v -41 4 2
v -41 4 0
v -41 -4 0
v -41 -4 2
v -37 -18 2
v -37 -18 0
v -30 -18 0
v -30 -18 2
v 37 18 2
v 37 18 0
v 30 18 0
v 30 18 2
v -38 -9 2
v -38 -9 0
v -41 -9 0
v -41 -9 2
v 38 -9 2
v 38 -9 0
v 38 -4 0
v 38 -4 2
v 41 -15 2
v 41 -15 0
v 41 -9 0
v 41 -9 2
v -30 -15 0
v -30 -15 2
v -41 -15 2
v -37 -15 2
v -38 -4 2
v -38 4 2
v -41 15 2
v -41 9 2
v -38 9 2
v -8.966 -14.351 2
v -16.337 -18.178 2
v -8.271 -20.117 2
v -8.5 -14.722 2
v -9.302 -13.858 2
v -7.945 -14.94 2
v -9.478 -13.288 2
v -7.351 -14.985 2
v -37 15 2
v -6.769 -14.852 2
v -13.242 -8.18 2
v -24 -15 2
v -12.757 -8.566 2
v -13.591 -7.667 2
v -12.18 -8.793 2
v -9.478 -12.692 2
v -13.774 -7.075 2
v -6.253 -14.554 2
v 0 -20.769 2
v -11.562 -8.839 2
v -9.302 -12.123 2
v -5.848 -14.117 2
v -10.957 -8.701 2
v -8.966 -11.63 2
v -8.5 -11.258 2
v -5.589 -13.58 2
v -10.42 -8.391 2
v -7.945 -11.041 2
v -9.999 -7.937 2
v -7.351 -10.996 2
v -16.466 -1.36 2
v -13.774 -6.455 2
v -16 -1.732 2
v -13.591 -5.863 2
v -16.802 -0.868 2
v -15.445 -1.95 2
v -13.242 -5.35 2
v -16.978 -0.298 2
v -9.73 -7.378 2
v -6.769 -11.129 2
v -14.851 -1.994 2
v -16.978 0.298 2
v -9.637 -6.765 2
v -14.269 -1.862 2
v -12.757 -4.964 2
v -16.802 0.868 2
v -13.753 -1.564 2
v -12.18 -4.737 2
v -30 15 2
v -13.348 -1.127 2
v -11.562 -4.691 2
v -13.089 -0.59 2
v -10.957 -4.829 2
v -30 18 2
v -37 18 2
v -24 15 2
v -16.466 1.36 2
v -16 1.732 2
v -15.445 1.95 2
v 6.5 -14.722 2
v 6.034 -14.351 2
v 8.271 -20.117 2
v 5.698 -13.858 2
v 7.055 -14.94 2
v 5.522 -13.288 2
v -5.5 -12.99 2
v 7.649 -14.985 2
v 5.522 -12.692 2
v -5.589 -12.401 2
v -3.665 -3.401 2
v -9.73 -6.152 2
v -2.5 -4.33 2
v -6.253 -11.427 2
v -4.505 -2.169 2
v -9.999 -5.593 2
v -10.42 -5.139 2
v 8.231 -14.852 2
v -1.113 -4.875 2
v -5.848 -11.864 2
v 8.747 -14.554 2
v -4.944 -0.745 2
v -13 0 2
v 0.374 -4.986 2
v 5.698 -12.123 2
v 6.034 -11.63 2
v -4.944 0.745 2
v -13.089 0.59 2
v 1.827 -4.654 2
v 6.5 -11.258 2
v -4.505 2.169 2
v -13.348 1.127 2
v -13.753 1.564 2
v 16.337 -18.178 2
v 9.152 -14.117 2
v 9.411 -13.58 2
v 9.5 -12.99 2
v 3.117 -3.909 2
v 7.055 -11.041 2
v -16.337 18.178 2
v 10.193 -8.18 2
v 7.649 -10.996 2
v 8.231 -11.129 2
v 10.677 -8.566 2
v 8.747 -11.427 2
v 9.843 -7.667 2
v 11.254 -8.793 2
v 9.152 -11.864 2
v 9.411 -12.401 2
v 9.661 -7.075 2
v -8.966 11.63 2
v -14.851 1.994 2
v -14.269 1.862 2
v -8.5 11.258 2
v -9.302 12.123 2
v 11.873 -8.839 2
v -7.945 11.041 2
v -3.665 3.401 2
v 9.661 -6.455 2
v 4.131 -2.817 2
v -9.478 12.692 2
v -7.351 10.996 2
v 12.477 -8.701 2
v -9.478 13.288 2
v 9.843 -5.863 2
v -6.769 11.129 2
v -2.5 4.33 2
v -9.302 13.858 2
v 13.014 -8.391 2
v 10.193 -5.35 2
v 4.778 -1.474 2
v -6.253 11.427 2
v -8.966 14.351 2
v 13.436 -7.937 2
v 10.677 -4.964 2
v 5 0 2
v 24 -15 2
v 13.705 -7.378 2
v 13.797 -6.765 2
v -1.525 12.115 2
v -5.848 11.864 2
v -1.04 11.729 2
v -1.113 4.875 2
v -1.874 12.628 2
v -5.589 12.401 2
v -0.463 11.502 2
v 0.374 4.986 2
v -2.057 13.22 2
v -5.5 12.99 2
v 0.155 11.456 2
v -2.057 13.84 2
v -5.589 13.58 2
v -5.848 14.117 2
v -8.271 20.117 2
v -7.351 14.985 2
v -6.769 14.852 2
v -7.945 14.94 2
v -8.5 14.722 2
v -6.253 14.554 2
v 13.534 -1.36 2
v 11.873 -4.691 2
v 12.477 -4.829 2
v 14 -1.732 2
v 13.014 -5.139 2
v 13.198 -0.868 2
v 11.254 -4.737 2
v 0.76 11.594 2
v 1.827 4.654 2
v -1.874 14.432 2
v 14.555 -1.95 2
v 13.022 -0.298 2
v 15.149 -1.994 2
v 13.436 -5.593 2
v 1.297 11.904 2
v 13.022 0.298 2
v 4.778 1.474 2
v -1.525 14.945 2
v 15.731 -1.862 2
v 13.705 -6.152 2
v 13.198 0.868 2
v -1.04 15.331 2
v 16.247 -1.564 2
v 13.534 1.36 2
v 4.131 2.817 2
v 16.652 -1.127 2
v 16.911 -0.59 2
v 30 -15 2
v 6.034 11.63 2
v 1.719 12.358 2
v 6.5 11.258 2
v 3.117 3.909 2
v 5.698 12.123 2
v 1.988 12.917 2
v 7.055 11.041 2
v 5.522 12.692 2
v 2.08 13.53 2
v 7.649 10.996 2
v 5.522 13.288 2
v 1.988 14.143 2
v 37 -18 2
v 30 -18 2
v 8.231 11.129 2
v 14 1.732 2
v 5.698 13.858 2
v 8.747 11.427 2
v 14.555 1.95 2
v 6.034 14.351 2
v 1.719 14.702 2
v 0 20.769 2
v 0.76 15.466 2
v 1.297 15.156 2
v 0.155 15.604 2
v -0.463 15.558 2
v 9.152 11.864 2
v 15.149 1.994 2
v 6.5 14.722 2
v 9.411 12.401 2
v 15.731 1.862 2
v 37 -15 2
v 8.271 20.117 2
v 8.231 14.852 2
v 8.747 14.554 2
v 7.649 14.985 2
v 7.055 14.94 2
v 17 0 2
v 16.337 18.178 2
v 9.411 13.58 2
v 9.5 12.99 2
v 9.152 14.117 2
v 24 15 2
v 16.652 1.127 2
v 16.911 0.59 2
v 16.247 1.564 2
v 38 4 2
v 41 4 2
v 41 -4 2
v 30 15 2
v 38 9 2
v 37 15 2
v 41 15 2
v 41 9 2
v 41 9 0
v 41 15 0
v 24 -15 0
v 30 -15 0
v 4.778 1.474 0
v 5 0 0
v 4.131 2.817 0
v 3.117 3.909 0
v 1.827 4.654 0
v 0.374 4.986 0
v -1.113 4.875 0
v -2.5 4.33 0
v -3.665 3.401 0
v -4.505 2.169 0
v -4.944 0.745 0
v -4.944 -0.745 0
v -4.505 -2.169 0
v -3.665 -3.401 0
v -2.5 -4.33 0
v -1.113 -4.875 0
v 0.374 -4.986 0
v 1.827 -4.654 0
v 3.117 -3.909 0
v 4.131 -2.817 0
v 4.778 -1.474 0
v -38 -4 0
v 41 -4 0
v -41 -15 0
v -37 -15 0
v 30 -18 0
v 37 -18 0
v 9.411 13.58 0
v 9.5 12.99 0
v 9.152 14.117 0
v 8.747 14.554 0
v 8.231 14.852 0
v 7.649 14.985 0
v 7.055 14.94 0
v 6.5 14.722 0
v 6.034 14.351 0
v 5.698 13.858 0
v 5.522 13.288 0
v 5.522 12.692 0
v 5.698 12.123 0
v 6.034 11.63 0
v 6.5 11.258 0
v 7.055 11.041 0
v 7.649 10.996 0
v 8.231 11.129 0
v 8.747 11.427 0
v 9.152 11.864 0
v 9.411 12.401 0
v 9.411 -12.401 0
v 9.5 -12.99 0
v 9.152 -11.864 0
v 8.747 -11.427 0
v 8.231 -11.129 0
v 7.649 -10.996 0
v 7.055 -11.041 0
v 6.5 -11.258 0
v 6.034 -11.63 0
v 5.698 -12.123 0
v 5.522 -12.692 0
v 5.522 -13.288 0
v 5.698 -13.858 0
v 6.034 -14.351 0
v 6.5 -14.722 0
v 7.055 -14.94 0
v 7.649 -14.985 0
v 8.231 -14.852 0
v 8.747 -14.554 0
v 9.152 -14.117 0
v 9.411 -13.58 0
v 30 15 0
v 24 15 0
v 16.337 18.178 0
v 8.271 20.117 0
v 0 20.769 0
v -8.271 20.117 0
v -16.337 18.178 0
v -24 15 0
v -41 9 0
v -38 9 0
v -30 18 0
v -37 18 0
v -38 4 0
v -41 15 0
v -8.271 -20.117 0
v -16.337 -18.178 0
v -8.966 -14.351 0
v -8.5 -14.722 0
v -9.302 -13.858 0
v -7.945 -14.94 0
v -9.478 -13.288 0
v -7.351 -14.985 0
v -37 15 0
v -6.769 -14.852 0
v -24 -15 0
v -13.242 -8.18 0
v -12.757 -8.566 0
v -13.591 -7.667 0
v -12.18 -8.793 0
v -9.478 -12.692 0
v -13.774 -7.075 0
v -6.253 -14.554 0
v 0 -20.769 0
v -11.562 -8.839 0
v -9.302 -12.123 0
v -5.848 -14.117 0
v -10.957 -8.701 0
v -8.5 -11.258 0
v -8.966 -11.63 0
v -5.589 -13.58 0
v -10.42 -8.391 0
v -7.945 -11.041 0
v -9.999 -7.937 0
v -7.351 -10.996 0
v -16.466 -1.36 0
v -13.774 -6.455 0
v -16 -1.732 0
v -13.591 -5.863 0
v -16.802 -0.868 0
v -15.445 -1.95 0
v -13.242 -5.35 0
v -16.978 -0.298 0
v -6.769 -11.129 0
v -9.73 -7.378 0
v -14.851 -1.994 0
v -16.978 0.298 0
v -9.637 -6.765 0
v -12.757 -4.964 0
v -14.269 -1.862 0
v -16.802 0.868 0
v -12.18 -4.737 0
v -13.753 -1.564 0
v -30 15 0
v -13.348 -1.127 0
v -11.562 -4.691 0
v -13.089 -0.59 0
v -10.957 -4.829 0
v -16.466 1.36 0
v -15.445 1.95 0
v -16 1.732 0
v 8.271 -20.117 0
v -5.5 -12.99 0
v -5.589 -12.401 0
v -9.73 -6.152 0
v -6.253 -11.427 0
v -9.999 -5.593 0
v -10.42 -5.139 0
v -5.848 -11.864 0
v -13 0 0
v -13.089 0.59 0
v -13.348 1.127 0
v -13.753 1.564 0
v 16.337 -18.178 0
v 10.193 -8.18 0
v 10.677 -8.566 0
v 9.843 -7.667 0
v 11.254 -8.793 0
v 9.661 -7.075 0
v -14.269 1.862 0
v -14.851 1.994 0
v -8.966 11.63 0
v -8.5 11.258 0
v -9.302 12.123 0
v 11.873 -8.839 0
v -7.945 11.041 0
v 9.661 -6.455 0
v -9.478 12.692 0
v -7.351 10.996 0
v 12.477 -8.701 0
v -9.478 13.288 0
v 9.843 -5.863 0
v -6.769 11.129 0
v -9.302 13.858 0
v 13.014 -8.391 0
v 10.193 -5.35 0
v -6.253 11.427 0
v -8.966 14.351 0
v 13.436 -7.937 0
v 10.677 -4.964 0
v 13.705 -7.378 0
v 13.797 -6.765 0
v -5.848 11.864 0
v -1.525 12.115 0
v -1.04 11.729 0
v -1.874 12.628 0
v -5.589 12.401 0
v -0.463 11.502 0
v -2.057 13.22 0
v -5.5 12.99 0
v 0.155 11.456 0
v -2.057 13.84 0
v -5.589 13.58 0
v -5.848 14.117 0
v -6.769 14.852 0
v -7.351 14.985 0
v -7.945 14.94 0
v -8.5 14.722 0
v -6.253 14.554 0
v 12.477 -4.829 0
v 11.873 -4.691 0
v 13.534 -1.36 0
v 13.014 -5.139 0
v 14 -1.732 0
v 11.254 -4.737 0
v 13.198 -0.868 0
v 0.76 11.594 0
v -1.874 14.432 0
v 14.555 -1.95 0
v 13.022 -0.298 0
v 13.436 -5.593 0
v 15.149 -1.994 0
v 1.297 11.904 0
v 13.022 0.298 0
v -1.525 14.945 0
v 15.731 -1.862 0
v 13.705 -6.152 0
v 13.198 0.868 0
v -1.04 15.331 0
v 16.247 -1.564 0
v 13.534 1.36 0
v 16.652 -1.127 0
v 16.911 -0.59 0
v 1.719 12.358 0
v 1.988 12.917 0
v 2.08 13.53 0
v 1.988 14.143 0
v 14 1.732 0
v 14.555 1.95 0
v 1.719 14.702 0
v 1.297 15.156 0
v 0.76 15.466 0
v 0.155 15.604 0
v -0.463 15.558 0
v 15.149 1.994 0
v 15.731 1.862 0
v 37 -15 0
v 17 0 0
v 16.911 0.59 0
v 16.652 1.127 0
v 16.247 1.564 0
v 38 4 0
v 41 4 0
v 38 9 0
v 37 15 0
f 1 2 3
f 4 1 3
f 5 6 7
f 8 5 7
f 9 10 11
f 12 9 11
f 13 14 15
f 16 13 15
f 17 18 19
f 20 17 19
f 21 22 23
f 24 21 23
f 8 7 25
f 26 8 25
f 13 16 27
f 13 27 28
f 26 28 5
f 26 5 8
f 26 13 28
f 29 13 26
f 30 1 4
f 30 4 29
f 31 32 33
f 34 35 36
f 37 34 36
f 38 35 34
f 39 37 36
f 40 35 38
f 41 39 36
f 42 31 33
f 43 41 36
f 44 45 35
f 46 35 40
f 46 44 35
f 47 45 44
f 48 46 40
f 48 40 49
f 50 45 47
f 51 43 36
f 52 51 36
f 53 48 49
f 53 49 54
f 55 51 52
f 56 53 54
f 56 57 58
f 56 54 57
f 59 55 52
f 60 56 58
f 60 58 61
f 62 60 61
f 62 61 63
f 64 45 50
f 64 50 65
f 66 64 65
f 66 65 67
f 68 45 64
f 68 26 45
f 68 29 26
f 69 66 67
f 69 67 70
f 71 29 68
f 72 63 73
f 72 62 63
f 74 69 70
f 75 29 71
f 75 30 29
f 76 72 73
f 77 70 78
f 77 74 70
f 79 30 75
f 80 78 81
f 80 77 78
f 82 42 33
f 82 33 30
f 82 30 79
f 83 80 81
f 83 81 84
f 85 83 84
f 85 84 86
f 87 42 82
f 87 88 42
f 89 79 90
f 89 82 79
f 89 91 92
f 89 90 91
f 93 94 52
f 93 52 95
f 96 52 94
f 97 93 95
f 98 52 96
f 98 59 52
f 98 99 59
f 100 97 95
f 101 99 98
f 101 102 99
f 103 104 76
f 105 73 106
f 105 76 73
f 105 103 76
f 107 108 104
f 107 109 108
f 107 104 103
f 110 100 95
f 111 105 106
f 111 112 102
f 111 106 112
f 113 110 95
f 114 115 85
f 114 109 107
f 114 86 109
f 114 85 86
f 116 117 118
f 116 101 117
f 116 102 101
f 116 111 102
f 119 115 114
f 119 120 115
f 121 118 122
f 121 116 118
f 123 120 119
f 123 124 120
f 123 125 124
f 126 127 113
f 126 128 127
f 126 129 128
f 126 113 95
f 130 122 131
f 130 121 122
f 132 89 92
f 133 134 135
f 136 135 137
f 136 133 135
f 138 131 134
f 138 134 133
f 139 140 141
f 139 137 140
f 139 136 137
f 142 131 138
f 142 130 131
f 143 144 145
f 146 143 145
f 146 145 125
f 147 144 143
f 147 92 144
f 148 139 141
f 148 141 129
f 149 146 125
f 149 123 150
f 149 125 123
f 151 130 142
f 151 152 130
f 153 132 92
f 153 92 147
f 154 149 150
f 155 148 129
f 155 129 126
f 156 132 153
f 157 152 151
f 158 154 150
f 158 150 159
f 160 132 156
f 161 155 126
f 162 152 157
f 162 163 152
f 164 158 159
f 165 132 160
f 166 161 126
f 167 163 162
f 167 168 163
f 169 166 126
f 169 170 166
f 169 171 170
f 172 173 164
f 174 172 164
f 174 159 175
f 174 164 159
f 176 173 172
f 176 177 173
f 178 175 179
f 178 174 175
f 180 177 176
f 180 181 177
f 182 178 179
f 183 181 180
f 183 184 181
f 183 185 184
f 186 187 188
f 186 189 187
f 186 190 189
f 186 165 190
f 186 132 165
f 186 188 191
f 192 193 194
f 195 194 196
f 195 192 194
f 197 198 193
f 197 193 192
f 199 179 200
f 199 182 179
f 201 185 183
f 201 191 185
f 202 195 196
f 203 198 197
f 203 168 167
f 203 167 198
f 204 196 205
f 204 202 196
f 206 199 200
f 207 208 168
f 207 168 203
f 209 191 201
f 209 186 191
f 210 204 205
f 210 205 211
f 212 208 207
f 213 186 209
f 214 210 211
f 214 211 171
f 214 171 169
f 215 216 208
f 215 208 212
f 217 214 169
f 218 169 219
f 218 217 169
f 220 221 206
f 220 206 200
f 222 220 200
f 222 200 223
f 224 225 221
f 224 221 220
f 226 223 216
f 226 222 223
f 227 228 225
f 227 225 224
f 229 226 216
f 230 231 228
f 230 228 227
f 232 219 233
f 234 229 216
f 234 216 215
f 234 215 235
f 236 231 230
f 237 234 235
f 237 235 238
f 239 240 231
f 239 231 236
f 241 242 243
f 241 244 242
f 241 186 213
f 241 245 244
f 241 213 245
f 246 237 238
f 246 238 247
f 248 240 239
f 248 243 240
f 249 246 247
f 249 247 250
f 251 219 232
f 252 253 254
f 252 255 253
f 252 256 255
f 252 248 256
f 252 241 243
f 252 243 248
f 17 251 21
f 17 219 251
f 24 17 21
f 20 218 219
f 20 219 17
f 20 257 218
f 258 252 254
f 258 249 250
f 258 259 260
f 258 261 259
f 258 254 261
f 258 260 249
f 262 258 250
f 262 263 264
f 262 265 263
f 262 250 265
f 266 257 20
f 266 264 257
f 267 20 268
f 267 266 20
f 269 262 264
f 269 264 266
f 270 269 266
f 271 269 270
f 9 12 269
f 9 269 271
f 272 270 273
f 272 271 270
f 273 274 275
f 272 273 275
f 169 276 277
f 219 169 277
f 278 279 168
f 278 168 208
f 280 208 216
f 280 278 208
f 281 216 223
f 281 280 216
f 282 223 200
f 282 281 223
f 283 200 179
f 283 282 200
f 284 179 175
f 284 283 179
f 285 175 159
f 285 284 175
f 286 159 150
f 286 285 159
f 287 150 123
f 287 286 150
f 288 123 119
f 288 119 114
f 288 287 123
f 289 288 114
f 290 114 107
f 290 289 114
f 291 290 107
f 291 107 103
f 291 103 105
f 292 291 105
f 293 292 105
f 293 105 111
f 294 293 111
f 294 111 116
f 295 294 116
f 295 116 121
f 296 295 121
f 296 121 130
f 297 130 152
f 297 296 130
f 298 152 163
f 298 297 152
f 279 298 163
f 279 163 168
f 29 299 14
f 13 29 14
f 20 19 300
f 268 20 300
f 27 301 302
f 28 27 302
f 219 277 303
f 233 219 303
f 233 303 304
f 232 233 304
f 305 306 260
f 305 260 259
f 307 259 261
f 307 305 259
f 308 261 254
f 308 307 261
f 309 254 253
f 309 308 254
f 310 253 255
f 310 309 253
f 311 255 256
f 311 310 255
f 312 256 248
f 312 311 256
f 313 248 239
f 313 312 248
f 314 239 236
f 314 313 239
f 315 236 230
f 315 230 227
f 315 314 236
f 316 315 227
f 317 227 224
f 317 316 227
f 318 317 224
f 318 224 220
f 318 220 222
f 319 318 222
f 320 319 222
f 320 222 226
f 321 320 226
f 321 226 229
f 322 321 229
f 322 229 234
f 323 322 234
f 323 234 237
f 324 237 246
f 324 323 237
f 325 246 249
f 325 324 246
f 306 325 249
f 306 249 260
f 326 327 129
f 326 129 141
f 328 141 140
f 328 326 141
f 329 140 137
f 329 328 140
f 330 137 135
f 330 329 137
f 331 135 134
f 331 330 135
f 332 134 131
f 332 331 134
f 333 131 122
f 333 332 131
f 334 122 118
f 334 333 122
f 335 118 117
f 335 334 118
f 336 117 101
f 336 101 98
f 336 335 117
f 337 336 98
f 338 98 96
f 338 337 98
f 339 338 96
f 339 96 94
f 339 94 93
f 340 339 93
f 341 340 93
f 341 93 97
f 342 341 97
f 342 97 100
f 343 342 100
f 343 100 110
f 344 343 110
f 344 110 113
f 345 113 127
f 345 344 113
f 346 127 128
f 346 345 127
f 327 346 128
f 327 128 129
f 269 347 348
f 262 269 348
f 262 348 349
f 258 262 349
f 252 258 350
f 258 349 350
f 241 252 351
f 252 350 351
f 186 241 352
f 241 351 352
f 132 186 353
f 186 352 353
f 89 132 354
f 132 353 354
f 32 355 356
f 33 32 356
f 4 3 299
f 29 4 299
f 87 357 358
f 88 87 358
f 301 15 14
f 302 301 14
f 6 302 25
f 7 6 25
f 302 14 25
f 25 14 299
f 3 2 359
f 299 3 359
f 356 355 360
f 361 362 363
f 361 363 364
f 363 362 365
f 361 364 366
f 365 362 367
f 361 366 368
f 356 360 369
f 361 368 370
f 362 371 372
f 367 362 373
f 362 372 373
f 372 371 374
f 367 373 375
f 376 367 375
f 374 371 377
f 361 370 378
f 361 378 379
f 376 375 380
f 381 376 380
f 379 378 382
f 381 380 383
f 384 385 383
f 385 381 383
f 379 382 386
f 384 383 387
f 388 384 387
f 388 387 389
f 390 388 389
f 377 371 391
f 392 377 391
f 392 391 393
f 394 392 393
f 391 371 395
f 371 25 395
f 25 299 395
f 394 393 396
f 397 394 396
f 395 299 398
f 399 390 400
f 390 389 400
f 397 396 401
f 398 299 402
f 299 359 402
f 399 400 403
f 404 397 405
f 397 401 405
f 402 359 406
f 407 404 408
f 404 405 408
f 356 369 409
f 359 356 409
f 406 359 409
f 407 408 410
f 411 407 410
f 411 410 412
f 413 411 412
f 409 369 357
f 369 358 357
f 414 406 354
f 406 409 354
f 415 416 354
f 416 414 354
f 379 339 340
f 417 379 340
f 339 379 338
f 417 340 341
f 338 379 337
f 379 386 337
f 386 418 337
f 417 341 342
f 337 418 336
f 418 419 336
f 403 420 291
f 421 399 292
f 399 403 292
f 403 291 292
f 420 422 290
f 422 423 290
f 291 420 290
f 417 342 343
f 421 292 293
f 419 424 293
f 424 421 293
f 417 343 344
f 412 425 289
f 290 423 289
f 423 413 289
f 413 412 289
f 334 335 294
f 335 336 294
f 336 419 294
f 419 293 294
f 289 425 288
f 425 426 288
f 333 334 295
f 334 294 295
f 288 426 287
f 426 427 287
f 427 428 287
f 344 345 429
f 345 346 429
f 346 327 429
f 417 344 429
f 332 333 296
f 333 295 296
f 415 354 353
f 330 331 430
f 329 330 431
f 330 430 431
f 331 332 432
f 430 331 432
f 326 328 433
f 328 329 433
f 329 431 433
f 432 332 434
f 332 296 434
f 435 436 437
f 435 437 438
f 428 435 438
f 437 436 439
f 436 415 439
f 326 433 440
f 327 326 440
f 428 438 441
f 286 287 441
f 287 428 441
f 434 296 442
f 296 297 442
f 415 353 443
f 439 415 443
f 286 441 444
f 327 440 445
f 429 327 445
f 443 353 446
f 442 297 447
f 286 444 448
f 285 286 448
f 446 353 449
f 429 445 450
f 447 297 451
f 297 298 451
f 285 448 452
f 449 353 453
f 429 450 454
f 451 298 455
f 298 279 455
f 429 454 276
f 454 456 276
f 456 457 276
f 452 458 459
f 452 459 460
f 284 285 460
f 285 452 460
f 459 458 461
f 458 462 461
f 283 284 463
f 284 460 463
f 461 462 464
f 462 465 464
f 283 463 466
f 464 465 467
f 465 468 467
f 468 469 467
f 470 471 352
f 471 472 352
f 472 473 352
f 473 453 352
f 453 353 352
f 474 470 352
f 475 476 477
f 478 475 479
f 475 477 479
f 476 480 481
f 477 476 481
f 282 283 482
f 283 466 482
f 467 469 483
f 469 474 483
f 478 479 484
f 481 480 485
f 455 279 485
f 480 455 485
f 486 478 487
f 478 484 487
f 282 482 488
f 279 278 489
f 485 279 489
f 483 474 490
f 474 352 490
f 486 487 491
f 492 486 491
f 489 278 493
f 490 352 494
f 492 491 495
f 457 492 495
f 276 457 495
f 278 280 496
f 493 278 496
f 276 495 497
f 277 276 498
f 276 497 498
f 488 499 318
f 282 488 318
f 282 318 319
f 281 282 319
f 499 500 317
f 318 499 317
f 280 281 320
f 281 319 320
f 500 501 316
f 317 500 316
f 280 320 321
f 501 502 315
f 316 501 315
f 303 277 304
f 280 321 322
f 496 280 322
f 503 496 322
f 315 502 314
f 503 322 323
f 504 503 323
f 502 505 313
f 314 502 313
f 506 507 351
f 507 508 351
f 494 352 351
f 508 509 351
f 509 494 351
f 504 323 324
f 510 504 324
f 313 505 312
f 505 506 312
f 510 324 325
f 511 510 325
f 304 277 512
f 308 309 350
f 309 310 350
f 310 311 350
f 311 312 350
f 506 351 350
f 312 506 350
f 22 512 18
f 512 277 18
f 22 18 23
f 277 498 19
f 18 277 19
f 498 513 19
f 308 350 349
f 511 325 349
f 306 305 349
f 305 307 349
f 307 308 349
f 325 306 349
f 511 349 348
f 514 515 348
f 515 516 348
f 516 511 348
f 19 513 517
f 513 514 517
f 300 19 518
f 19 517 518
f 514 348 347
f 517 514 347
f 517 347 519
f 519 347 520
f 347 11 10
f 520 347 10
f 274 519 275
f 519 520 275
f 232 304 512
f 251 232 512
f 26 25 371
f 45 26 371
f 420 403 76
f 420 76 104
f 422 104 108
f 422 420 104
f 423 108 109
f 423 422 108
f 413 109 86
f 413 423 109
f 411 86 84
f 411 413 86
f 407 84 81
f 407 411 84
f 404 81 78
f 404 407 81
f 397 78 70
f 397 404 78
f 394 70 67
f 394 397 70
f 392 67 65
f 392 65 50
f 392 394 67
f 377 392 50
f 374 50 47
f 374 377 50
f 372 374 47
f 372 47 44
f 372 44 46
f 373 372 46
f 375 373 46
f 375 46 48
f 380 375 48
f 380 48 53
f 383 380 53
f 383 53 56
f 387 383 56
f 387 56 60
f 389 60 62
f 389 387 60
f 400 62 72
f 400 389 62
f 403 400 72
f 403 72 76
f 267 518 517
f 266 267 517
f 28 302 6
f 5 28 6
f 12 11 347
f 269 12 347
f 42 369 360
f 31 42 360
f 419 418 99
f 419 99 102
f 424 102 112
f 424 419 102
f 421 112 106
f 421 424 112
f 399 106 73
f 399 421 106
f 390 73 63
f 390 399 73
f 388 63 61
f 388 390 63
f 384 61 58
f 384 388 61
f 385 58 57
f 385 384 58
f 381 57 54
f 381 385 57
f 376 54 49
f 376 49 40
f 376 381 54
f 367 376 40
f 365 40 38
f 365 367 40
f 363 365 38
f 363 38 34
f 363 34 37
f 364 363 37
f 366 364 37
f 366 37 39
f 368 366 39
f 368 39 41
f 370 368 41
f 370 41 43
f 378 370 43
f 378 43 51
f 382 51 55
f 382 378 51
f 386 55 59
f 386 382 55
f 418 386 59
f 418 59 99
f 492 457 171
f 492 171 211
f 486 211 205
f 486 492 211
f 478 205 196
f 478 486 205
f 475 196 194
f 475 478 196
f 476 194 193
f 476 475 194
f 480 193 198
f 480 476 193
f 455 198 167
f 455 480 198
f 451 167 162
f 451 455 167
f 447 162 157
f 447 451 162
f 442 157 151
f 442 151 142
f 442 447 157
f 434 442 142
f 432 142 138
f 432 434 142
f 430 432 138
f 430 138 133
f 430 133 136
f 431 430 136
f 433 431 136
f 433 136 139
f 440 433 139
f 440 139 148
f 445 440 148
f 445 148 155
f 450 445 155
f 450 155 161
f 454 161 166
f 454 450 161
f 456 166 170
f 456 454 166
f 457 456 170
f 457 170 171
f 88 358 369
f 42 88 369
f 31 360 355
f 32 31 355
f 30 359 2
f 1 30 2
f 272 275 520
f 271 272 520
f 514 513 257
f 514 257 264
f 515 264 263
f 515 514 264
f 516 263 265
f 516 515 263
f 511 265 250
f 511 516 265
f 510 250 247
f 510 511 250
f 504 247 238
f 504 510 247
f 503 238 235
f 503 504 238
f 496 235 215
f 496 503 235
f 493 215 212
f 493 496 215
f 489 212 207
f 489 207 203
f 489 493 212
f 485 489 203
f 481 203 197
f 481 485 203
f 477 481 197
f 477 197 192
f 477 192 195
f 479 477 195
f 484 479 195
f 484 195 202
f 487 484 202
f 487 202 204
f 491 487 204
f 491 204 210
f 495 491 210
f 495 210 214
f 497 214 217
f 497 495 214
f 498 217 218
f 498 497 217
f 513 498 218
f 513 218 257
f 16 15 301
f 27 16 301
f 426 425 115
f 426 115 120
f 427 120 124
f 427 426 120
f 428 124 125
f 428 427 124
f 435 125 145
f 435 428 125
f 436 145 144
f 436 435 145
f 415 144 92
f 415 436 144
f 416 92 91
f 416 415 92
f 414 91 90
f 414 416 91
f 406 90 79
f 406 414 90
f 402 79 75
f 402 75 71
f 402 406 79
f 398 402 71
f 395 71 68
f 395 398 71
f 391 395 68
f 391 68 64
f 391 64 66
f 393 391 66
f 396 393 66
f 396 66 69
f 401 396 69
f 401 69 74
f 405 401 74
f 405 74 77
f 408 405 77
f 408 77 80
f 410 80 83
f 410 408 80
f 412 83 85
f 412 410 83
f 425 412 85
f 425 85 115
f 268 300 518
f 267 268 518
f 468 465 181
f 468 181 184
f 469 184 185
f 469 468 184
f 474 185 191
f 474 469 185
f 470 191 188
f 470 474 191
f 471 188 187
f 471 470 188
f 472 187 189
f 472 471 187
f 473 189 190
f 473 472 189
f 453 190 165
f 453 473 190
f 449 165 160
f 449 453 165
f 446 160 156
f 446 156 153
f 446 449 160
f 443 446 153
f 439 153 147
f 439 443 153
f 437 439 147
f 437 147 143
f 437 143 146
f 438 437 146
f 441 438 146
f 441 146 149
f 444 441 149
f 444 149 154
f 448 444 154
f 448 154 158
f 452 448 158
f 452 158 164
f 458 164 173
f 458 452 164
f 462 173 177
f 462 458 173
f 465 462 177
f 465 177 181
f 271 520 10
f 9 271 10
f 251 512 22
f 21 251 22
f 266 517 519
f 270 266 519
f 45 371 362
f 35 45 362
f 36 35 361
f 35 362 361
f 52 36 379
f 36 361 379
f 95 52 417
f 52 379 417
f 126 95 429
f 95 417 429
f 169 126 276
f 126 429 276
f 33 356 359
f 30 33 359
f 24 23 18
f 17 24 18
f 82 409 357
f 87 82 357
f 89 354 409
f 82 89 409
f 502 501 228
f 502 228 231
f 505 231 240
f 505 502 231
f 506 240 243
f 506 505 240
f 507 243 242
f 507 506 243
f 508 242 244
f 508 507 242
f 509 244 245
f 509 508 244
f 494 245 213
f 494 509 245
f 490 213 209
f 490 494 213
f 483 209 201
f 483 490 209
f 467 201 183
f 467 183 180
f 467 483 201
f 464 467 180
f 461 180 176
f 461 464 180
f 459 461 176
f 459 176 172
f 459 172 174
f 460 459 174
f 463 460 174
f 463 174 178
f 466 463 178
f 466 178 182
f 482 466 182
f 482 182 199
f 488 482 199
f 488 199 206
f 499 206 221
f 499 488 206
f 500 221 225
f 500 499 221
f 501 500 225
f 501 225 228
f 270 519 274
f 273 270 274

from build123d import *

# Parameters (mm, degrees)
SKETCH_1_R      = 2
SKETCH_1_R_2    = 2.08
SKETCH_1_R_3    = 5
EXTRUDE_2_DEPTH = 2


with BuildPart() as part:
    # 草图1 → 凸台-拉伸2 (new body)
    with BuildSketch(Plane.XY):
        with BuildLine():
            ThreePointArc((-24, -15), (0, -20.769061509), (24, -15))
            Line((24, -15), (30, -15))
            Line((30, -15), (30, -18))
            Line((30, -18), (37, -18))
            Line((37, -18), (37, -15))
            Line((37, -15), (41, -15))
            Line((41, -15), (41, -9))
            Line((41, -9), (38, -9))
            Line((38, -9), (38, -4))
            Line((38, -4), (41, -4))
            Line((41, -4), (41, 4))
            Line((41, 4), (38, 4))
            Line((38, 4), (38, 9))
            Line((38, 9), (41, 9))
            Line((41, 9), (41, 15))
            Line((41, 15), (37, 15))
            Line((37, 15), (37, 18))
            Line((37, 18), (30, 18))
            Line((30, 18), (30, 15))
            Line((30, 15), (24, 15))
            ThreePointArc((24, 15), (0, 20.769061509), (-24, 15))
            Line((-24, 15), (-30, 15))
            Line((-30, 15), (-30, 18))
            Line((-30, 18), (-37, 18))
            Line((-37, 18), (-37, 15))
            Line((-37, 15), (-41, 15))
            Line((-41, 15), (-41, 9))
            Line((-41, 9), (-38, 9))
            Line((-38, 9), (-38, 4))
            Line((-38, 4), (-41, 4))
            Line((-41, 4), (-41, -4))
            Line((-41, -4), (-38, -4))
            Line((-38, -4), (-38, -9))
            Line((-38, -9), (-41, -9))
            Line((-41, -9), (-41, -15))
            Line((-41, -15), (-37, -15))
            Line((-37, -15), (-37, -18))
            Line((-37, -18), (-30, -18))
            Line((-30, -18), (-30, -15))
            Line((-30, -15), (-24, -15))
        make_face()
        with Locations((7.5, 12.990381057)):
            Circle(SKETCH_1_R, mode=Mode.SUBTRACT)
        with Locations((0, 13.53)):
            Circle(SKETCH_1_R_2, mode=Mode.SUBTRACT)
        with Locations((-7.5, 12.990381057)):
            Circle(SKETCH_1_R, mode=Mode.SUBTRACT)
        with Locations((-15, 0)):
            Circle(SKETCH_1_R, mode=Mode.SUBTRACT)
        with Locations((-11.717323713, -6.765)):
            Circle(SKETCH_1_R_2, mode=Mode.SUBTRACT)
        with Locations((-7.5, -12.990381057)):
            Circle(SKETCH_1_R, mode=Mode.SUBTRACT)
        with Locations((7.5, -12.990381057)):
            Circle(SKETCH_1_R, mode=Mode.SUBTRACT)
        with Locations((11.717323713, -6.765)):
            Circle(SKETCH_1_R_2, mode=Mode.SUBTRACT)
        with Locations((15, 0)):
            Circle(SKETCH_1_R, mode=Mode.SUBTRACT)
        Circle(SKETCH_1_R_3, mode=Mode.SUBTRACT)
    extrude(amount=EXTRUDE_2_DEPTH)


solid = part.part
